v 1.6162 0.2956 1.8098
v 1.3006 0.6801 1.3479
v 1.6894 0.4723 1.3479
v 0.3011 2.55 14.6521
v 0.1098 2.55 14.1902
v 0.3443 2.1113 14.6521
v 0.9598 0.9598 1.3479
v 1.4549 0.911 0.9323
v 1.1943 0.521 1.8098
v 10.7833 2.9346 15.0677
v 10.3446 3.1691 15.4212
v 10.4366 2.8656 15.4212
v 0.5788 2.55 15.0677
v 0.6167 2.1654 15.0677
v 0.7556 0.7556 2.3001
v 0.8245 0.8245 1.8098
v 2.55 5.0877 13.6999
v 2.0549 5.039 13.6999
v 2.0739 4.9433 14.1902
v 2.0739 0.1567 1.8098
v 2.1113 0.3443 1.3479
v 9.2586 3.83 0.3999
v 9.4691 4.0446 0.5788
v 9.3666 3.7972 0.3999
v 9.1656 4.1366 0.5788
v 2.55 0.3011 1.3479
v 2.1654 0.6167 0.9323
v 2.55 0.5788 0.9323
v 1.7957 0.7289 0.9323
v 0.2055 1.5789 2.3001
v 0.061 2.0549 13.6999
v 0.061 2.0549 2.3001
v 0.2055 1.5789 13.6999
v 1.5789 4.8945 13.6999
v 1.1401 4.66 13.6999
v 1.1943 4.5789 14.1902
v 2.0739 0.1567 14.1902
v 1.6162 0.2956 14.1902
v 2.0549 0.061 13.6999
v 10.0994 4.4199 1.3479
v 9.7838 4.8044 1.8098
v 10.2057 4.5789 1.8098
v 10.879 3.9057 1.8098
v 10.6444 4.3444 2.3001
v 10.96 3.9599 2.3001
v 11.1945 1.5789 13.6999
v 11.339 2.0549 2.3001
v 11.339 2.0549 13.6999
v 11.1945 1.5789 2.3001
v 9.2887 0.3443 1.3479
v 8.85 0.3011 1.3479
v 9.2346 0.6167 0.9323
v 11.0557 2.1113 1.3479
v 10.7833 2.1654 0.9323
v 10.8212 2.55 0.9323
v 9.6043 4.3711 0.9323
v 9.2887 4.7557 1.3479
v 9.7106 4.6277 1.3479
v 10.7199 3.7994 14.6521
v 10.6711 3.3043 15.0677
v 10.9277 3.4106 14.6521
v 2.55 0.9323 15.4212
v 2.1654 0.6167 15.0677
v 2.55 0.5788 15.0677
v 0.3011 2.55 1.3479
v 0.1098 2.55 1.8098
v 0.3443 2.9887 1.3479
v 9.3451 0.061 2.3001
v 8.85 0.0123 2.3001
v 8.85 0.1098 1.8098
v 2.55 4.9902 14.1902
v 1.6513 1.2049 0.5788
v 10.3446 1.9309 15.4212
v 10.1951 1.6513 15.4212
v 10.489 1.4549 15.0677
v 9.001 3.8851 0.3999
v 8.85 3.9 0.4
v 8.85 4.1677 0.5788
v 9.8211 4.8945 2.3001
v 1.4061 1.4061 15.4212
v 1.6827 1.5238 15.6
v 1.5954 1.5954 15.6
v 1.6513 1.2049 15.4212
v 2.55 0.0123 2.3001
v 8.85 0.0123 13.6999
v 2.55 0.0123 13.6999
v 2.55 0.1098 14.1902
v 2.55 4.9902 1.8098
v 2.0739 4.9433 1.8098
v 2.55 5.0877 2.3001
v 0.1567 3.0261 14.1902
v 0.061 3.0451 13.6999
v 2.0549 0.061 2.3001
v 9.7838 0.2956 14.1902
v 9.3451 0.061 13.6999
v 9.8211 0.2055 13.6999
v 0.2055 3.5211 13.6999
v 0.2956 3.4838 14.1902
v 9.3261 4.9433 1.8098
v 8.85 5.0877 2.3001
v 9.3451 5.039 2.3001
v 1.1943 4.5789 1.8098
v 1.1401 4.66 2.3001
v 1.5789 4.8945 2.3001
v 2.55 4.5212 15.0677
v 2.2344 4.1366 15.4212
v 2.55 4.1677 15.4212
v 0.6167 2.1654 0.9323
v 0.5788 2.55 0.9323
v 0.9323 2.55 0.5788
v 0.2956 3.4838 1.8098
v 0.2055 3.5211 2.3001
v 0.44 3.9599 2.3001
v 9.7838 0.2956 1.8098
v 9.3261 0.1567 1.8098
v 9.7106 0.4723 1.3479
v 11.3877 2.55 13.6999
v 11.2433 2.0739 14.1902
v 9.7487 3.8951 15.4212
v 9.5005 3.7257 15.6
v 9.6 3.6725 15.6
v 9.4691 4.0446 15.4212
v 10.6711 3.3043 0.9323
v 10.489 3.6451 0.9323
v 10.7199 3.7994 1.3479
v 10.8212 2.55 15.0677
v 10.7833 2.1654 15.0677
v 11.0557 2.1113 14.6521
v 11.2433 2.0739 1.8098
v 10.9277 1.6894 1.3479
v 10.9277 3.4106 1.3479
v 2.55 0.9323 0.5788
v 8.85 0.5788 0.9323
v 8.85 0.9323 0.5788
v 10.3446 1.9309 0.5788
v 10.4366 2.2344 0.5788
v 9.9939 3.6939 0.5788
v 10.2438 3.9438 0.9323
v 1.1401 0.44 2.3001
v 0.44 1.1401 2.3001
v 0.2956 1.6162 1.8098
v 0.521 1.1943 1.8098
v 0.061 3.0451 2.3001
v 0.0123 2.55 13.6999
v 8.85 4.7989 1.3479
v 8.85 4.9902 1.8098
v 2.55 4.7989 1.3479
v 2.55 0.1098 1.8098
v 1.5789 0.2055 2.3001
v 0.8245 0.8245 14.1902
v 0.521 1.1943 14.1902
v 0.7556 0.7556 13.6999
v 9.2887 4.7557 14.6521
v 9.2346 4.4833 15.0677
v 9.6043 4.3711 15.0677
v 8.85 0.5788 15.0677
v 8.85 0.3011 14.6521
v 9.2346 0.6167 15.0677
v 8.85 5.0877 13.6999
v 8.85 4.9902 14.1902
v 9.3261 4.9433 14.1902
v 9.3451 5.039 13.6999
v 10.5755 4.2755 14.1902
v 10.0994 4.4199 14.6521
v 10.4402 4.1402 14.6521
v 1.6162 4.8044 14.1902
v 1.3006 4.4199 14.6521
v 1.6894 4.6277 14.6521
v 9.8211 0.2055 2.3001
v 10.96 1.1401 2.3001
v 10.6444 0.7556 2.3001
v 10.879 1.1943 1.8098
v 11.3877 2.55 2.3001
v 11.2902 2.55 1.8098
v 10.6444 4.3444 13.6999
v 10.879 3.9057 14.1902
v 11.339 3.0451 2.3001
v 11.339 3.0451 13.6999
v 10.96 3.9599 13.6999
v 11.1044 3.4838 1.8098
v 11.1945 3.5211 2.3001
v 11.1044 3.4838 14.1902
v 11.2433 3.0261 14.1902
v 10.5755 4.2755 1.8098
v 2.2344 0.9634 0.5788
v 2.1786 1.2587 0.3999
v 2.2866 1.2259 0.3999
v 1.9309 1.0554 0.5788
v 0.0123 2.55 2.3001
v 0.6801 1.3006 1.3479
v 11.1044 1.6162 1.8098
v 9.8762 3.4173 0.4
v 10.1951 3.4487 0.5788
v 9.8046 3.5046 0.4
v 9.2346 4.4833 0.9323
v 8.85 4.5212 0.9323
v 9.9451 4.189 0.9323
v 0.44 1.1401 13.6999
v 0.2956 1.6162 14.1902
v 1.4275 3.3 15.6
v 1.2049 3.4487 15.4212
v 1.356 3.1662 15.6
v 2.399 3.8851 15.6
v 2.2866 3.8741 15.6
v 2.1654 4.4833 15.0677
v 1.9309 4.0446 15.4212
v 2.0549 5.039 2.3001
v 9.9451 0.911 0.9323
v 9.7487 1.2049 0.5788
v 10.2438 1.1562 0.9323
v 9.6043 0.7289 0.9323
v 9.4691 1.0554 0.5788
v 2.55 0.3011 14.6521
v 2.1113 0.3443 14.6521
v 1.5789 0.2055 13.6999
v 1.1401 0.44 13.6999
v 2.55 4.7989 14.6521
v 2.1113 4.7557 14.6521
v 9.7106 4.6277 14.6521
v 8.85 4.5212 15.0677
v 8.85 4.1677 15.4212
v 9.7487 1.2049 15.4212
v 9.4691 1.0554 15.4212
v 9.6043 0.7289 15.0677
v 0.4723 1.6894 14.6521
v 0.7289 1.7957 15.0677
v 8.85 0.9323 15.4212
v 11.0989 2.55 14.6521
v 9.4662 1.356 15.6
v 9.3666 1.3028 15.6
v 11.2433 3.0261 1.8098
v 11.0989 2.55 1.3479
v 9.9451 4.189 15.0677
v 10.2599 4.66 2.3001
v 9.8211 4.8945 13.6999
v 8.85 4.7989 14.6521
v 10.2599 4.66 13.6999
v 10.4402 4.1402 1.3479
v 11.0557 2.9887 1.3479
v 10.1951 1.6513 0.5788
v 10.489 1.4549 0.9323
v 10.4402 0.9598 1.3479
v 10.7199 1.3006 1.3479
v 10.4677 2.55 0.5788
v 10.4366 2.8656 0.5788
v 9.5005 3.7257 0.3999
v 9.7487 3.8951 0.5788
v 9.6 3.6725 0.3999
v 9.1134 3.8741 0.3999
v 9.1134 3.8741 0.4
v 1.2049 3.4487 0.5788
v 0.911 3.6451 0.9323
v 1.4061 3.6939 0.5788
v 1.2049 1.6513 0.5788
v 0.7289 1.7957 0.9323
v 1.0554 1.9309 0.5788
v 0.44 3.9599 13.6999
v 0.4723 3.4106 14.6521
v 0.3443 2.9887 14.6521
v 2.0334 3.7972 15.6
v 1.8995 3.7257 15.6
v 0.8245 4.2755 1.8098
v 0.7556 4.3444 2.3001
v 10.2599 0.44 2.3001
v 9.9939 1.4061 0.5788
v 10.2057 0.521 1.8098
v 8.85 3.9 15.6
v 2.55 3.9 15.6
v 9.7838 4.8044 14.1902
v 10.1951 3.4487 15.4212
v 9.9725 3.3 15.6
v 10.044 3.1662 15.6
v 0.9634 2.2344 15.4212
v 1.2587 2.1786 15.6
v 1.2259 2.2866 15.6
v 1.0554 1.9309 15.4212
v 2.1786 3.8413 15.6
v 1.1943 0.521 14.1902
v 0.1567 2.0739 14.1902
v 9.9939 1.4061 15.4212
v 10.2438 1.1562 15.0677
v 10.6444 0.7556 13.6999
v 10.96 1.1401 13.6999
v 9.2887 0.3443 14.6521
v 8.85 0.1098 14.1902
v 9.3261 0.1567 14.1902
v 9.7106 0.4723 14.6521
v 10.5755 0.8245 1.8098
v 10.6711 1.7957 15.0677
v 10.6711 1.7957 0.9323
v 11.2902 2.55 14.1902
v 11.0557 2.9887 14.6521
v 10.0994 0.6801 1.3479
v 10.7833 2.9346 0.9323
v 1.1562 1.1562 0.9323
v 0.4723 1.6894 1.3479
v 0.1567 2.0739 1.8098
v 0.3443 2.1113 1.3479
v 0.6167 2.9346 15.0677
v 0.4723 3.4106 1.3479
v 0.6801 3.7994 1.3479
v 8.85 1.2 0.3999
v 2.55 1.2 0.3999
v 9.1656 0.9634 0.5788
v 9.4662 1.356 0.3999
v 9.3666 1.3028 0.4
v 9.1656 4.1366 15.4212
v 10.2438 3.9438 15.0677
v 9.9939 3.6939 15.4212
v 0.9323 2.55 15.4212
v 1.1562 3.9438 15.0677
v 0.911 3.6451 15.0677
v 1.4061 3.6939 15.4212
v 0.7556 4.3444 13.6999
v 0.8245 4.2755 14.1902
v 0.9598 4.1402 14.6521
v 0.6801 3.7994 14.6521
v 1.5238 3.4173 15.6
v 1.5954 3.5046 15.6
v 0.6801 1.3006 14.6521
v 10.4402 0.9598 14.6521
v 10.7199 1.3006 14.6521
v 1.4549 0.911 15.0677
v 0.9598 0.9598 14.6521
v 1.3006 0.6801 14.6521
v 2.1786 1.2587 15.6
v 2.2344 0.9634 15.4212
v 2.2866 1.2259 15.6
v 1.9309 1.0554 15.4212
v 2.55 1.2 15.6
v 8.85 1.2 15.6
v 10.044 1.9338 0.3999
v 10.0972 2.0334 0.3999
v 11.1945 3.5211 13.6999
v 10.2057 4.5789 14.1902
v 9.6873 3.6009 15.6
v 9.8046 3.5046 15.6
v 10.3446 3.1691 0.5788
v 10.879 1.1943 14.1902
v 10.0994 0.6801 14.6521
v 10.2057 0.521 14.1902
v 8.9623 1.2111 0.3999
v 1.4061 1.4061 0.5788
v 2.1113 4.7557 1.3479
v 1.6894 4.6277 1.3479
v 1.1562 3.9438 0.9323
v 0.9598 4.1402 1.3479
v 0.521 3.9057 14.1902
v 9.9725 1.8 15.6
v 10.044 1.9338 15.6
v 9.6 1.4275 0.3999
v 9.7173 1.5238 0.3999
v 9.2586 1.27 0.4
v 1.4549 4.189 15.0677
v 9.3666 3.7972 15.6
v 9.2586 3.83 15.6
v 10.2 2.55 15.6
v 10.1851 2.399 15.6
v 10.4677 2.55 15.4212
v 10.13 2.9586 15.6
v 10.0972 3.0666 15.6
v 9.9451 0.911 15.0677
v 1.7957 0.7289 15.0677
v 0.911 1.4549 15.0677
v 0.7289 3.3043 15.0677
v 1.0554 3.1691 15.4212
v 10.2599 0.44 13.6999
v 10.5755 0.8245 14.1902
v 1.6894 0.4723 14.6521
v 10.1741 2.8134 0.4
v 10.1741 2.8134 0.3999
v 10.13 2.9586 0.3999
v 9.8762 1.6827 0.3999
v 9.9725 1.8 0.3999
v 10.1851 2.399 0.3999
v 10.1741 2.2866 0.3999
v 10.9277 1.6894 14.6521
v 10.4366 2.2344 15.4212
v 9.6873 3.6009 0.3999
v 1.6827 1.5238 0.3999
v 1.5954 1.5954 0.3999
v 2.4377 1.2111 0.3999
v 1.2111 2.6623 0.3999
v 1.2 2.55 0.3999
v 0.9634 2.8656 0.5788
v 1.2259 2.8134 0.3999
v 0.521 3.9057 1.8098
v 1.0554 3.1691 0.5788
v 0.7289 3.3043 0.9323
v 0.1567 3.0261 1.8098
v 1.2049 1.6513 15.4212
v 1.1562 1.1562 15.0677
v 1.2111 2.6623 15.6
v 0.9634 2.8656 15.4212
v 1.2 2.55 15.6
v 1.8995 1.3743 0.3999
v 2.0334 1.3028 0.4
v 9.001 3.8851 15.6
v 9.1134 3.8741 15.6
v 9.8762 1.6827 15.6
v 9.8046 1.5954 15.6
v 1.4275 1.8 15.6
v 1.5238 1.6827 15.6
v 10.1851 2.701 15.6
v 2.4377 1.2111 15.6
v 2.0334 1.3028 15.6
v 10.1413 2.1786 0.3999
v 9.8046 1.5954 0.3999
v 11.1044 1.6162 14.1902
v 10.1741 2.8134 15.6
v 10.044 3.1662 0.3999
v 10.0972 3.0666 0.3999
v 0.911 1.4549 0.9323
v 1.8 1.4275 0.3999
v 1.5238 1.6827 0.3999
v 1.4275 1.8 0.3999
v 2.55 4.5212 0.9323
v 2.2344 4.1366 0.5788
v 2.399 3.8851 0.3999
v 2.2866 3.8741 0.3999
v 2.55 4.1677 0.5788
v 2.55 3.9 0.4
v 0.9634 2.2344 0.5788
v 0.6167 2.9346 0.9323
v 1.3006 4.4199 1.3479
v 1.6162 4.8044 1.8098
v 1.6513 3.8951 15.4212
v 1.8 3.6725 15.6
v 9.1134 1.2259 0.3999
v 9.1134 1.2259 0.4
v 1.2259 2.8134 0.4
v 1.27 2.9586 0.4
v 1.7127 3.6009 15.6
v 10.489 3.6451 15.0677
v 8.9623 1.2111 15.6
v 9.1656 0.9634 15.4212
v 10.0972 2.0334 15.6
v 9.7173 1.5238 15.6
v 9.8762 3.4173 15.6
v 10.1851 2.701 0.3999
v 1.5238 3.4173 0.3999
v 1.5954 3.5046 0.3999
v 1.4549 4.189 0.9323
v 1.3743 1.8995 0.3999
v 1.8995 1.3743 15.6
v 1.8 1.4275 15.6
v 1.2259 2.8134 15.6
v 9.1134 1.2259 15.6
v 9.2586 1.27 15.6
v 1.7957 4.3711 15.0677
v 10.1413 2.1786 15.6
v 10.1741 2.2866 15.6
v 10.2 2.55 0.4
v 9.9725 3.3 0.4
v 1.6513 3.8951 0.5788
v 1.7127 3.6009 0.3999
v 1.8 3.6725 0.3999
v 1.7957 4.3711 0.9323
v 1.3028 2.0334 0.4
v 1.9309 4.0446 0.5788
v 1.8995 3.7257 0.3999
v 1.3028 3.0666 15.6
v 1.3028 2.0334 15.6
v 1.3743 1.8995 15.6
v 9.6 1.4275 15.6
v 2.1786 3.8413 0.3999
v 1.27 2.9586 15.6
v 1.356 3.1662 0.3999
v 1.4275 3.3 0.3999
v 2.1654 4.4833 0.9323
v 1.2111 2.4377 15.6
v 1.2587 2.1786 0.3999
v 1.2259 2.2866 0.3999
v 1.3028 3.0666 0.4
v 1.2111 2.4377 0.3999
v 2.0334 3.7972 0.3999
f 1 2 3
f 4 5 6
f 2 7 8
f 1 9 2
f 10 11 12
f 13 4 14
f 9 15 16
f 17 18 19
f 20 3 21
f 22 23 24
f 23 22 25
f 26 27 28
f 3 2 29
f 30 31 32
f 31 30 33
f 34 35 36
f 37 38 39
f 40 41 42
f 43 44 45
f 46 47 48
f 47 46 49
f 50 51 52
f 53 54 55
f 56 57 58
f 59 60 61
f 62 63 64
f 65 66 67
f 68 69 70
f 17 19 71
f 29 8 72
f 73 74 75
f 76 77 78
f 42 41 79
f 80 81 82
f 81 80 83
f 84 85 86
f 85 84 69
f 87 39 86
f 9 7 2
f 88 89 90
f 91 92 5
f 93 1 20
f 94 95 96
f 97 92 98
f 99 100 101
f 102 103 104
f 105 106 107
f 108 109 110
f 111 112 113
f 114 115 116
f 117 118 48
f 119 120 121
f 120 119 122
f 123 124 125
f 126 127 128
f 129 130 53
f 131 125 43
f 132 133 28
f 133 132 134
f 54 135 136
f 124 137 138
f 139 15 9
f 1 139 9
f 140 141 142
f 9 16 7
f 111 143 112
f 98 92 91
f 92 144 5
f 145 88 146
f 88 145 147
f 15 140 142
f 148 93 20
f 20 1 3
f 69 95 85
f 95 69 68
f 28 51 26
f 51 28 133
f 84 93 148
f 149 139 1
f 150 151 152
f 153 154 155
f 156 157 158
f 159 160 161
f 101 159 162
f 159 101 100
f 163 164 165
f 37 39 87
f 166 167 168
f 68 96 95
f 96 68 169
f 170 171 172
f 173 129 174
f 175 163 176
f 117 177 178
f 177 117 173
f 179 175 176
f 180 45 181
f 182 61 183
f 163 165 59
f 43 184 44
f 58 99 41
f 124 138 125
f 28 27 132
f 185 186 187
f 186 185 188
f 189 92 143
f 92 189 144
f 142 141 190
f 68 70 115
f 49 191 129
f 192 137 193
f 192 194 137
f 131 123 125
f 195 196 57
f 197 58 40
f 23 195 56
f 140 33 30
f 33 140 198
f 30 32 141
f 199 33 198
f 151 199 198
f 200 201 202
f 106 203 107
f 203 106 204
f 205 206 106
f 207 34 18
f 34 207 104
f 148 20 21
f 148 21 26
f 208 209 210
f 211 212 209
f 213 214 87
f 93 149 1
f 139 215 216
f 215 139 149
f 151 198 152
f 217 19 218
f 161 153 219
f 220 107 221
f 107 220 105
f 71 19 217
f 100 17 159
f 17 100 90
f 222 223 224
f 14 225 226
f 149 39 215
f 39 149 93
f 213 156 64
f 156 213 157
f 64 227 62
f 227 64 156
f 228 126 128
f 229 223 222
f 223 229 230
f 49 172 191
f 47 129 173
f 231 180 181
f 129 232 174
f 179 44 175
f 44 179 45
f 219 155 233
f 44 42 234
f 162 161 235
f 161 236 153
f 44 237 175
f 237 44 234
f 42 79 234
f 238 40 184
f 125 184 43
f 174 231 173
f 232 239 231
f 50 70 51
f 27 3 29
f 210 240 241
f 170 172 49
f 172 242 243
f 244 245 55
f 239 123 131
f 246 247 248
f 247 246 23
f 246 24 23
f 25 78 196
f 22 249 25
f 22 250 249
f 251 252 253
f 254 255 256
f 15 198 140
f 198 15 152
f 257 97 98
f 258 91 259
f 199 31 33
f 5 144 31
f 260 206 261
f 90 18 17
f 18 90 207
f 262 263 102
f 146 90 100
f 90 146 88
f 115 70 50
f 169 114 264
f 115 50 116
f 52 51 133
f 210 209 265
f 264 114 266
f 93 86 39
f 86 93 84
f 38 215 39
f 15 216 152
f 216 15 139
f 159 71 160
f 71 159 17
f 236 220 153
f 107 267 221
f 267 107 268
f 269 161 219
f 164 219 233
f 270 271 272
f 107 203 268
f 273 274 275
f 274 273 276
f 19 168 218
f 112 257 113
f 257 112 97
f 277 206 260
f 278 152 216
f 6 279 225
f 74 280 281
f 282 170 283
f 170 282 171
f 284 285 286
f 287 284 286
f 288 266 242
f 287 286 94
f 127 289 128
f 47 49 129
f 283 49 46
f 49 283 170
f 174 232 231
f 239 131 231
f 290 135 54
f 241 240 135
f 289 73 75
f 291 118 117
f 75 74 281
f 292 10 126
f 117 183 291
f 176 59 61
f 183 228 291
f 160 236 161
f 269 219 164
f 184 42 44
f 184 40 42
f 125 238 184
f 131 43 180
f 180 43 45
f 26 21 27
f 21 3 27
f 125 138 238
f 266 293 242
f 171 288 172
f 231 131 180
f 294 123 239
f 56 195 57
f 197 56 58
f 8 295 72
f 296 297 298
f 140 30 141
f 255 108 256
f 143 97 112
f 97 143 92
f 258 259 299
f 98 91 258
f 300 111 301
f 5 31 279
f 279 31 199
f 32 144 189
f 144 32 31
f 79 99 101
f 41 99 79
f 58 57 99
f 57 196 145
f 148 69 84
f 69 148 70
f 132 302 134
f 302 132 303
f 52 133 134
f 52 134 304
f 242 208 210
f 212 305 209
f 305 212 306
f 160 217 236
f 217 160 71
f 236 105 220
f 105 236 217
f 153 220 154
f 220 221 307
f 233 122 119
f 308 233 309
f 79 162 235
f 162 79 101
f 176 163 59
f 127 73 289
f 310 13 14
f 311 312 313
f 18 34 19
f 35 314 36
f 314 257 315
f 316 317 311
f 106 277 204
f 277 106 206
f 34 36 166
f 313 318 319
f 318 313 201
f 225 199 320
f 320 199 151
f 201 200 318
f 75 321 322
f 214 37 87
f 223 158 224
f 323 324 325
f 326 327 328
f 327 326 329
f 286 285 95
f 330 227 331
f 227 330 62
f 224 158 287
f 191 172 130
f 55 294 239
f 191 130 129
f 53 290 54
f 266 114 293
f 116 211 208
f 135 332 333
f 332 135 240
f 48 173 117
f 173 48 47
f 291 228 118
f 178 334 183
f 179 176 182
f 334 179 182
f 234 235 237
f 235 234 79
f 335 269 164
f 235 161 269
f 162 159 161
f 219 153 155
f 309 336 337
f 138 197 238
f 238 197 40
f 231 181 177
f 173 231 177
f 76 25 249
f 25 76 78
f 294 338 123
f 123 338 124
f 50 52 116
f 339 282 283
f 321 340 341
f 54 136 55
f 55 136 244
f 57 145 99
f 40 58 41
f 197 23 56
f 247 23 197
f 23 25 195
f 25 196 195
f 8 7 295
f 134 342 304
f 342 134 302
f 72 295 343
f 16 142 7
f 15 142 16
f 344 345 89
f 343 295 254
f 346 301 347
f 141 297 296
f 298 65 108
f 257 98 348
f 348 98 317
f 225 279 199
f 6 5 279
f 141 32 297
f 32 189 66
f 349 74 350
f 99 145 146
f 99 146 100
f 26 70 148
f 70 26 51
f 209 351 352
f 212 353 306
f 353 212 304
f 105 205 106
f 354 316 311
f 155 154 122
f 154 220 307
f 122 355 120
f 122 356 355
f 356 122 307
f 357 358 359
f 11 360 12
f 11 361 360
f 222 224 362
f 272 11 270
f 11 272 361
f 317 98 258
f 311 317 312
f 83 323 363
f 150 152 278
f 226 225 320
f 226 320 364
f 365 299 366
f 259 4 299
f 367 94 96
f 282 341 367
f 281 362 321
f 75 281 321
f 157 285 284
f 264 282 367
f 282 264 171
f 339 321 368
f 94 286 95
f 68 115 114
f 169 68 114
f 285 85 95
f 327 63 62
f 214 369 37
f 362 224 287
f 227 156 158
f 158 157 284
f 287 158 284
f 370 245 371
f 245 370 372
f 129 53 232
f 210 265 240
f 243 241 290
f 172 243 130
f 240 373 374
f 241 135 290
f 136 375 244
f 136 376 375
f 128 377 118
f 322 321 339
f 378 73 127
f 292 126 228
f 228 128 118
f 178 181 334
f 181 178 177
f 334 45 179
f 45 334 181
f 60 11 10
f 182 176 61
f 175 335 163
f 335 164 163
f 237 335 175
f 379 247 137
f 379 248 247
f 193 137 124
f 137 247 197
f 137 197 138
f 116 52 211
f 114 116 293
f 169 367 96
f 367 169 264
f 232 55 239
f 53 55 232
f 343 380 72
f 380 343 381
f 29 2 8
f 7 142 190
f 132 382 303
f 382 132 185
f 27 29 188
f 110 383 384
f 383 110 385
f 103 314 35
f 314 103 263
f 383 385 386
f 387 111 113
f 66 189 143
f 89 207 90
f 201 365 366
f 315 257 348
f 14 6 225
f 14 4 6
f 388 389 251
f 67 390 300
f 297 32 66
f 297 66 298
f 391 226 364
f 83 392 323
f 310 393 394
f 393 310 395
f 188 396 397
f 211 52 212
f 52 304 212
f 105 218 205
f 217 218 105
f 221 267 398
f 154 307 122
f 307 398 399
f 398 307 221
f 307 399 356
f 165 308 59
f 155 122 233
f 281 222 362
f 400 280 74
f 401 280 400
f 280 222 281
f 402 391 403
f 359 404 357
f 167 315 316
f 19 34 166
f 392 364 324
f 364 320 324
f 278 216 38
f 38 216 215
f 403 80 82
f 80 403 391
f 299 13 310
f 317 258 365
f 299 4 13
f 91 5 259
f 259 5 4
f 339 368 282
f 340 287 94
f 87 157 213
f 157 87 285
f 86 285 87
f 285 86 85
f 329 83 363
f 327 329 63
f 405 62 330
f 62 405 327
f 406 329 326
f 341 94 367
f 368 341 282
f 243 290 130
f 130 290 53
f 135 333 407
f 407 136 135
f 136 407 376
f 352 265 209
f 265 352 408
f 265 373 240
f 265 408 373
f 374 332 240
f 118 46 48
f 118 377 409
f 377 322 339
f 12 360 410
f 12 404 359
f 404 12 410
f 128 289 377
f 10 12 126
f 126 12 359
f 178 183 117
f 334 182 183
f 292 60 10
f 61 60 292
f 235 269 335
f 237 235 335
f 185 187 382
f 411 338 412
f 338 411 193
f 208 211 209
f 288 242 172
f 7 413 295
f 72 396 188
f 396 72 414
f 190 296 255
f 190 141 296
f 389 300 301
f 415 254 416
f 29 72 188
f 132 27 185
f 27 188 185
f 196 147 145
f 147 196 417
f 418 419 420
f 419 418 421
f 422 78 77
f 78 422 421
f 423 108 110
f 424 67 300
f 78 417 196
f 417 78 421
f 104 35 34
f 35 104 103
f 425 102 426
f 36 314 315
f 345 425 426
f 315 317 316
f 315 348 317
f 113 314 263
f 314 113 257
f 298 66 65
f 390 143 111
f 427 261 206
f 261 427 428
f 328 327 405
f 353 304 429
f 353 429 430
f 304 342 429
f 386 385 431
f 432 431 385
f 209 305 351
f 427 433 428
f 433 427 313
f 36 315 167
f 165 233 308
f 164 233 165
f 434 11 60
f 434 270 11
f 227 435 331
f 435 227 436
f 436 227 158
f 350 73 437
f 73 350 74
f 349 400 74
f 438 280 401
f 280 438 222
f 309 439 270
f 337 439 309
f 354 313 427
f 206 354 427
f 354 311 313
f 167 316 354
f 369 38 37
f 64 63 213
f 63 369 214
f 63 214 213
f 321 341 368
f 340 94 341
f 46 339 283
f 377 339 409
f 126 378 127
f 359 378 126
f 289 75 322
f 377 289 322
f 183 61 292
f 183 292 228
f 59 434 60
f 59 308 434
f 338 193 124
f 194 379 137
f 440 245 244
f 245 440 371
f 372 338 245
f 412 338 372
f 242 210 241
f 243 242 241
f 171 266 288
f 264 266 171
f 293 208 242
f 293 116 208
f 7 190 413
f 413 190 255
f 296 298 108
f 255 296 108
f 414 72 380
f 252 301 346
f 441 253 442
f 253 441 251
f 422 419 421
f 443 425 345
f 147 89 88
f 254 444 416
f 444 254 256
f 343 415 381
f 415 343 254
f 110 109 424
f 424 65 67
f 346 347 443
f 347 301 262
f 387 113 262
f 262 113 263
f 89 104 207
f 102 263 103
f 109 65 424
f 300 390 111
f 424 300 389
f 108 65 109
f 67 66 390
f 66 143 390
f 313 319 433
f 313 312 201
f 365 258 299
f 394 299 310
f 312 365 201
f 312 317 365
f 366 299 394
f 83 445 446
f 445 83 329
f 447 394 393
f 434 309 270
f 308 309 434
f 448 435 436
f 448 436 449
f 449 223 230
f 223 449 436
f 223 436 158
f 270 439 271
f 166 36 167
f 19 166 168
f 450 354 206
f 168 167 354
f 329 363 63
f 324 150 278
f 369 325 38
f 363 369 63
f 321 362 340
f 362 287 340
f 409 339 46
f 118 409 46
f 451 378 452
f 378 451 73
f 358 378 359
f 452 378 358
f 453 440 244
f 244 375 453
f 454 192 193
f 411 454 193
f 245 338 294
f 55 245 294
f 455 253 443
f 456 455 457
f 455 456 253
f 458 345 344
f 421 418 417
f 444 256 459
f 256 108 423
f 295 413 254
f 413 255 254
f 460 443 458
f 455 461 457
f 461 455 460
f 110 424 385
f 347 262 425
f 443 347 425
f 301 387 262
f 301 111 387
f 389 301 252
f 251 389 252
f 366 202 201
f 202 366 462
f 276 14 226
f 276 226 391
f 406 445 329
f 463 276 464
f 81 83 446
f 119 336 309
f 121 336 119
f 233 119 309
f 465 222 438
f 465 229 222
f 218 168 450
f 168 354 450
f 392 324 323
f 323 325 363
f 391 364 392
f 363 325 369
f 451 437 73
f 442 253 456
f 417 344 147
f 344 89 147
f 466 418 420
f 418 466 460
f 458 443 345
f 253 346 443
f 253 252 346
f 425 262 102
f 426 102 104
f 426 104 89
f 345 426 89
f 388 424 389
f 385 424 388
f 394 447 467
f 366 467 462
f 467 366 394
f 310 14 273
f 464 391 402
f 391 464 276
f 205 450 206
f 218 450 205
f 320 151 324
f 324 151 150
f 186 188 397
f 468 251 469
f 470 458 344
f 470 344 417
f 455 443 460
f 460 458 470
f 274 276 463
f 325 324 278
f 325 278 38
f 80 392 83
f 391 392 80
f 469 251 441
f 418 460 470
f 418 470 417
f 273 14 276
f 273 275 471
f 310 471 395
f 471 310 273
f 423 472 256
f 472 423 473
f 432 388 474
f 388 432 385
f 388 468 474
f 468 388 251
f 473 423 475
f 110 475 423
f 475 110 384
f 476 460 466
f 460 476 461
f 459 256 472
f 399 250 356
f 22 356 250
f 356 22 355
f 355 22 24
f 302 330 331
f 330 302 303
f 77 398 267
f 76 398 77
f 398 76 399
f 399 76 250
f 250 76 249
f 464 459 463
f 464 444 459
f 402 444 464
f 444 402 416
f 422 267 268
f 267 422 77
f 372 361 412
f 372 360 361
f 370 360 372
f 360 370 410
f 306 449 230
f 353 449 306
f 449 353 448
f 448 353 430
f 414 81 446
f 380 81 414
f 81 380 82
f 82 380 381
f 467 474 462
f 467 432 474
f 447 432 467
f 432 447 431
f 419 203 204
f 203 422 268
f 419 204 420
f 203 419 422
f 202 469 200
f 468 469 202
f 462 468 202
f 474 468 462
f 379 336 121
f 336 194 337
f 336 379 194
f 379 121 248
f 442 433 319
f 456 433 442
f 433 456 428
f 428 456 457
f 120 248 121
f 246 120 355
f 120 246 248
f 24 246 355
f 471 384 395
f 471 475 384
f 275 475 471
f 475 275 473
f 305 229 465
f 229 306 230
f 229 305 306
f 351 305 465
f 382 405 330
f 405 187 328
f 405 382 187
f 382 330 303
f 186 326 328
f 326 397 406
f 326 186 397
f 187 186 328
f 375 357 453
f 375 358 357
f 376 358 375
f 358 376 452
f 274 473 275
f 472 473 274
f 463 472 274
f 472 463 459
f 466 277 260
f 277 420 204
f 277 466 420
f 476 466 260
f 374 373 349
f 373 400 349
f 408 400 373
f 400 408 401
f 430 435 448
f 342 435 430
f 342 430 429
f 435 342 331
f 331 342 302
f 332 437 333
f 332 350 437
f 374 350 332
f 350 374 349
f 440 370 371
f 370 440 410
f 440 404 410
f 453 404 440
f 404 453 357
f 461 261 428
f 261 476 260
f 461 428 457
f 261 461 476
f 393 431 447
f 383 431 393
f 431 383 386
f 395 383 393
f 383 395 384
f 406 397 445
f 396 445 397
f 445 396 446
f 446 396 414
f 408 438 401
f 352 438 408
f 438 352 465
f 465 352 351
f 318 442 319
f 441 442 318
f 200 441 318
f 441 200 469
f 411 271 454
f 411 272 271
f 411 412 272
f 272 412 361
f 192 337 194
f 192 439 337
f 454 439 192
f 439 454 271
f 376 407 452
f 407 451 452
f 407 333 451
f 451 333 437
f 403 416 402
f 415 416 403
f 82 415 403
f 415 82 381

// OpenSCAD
W = 9;
H = 8 * 2;
R = 1.35;
thick = 1.2;

difference() {
    hull() {
        for (x = [R + thick, W + thick * 2 - (R + thick)])
            for (z = [R + thick, H - (R + thick)])
                translate([x, R + thick, z])
                    sphere(r = R + thick, h = H, $fn = 32);
    }
    hull() {
        translate([R + thick, R + thick, 0])
            cylinder(r = R, h = H, $fn = 32);
        translate([W + thick * 2 - (R + thick), R + thick, 0])
            cylinder(r = R, h = H, $fn = 32);
    }
}
